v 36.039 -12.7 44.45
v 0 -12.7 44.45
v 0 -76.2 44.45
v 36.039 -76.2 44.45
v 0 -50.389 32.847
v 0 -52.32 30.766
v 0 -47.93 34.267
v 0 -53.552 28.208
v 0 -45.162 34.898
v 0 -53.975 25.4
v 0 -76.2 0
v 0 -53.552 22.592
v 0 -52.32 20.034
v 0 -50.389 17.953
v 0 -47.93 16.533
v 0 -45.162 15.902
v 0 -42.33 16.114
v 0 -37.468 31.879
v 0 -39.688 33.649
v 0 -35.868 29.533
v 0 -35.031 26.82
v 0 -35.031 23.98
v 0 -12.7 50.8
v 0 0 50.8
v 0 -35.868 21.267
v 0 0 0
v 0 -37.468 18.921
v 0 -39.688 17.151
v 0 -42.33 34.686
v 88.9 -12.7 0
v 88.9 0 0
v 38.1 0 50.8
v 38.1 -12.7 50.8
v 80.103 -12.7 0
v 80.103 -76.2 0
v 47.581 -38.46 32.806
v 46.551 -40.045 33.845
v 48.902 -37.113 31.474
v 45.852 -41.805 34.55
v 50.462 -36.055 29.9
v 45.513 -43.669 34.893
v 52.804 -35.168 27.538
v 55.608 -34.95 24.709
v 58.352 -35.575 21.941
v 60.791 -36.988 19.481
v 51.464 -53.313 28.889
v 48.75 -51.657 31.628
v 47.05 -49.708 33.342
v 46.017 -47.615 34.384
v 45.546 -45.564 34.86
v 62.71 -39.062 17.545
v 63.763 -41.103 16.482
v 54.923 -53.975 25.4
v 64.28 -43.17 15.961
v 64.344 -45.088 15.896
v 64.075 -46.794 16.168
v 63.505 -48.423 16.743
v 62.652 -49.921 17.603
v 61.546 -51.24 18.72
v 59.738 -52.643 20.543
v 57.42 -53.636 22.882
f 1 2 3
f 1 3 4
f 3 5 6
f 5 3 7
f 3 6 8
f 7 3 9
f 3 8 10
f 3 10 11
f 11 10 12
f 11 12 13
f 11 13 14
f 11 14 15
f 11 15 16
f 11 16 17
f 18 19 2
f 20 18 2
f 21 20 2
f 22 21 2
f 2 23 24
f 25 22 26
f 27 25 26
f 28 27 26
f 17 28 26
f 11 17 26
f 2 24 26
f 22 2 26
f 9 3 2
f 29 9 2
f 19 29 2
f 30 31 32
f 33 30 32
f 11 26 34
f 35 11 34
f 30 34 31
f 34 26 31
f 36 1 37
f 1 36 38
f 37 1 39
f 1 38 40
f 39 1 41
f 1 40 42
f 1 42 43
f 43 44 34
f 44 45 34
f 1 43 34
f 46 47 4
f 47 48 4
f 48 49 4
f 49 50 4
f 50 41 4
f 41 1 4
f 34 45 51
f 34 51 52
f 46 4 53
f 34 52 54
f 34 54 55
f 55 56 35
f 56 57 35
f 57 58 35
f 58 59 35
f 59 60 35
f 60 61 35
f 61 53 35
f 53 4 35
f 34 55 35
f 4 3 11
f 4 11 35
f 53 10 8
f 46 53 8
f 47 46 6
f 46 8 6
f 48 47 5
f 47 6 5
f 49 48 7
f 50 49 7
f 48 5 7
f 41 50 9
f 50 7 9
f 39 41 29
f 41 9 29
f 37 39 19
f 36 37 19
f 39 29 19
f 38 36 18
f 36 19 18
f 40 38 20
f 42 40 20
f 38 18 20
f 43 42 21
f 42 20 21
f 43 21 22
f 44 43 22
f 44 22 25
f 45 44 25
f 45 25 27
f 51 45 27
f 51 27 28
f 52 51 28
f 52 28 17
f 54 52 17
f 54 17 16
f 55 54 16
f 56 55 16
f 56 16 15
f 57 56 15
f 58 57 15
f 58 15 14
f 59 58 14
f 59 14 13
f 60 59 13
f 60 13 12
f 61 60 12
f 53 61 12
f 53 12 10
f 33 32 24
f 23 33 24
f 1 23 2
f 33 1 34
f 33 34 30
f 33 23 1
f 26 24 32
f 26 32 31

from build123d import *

# Parameters (mm, degrees)
F1_DEPTH = 76.2
F3_DEPTH = 63.5
F4_R     = 9.525
F5_DEPTH = 101.6


with BuildPart() as f1:
    # F0 (on Front) → F1 (new body)
    with BuildSketch(Plane.XZ):
        Polygon((0, 50.8), (0, 0), (88.9, 0), (38.1, 50.8), align=None)
    extrude(amount=F1_DEPTH)

    # F2 (on face) → F3 (cut)
    with BuildSketch(Plane.XZ.offset(76.2)):
        Polygon((0, 50.8), (0, 44.45), (36.038775, 44.45), (80.102558, 0), (88.9, 0), (38.1, 50.8), align=None)
    extrude(amount=-F3_DEPTH, mode=Mode.SUBTRACT)

    # F4 (on face) → F5 (cut)
    with BuildSketch(Plane(origin=(0, 0, 0), x_dir=(0, -1, 0), z_dir=(-1, 0, 0))):
        with Locations((44.45, 25.4)):
            Circle(F4_R)
    extrude(amount=-F5_DEPTH, mode=Mode.SUBTRACT)


solid = f1.part
